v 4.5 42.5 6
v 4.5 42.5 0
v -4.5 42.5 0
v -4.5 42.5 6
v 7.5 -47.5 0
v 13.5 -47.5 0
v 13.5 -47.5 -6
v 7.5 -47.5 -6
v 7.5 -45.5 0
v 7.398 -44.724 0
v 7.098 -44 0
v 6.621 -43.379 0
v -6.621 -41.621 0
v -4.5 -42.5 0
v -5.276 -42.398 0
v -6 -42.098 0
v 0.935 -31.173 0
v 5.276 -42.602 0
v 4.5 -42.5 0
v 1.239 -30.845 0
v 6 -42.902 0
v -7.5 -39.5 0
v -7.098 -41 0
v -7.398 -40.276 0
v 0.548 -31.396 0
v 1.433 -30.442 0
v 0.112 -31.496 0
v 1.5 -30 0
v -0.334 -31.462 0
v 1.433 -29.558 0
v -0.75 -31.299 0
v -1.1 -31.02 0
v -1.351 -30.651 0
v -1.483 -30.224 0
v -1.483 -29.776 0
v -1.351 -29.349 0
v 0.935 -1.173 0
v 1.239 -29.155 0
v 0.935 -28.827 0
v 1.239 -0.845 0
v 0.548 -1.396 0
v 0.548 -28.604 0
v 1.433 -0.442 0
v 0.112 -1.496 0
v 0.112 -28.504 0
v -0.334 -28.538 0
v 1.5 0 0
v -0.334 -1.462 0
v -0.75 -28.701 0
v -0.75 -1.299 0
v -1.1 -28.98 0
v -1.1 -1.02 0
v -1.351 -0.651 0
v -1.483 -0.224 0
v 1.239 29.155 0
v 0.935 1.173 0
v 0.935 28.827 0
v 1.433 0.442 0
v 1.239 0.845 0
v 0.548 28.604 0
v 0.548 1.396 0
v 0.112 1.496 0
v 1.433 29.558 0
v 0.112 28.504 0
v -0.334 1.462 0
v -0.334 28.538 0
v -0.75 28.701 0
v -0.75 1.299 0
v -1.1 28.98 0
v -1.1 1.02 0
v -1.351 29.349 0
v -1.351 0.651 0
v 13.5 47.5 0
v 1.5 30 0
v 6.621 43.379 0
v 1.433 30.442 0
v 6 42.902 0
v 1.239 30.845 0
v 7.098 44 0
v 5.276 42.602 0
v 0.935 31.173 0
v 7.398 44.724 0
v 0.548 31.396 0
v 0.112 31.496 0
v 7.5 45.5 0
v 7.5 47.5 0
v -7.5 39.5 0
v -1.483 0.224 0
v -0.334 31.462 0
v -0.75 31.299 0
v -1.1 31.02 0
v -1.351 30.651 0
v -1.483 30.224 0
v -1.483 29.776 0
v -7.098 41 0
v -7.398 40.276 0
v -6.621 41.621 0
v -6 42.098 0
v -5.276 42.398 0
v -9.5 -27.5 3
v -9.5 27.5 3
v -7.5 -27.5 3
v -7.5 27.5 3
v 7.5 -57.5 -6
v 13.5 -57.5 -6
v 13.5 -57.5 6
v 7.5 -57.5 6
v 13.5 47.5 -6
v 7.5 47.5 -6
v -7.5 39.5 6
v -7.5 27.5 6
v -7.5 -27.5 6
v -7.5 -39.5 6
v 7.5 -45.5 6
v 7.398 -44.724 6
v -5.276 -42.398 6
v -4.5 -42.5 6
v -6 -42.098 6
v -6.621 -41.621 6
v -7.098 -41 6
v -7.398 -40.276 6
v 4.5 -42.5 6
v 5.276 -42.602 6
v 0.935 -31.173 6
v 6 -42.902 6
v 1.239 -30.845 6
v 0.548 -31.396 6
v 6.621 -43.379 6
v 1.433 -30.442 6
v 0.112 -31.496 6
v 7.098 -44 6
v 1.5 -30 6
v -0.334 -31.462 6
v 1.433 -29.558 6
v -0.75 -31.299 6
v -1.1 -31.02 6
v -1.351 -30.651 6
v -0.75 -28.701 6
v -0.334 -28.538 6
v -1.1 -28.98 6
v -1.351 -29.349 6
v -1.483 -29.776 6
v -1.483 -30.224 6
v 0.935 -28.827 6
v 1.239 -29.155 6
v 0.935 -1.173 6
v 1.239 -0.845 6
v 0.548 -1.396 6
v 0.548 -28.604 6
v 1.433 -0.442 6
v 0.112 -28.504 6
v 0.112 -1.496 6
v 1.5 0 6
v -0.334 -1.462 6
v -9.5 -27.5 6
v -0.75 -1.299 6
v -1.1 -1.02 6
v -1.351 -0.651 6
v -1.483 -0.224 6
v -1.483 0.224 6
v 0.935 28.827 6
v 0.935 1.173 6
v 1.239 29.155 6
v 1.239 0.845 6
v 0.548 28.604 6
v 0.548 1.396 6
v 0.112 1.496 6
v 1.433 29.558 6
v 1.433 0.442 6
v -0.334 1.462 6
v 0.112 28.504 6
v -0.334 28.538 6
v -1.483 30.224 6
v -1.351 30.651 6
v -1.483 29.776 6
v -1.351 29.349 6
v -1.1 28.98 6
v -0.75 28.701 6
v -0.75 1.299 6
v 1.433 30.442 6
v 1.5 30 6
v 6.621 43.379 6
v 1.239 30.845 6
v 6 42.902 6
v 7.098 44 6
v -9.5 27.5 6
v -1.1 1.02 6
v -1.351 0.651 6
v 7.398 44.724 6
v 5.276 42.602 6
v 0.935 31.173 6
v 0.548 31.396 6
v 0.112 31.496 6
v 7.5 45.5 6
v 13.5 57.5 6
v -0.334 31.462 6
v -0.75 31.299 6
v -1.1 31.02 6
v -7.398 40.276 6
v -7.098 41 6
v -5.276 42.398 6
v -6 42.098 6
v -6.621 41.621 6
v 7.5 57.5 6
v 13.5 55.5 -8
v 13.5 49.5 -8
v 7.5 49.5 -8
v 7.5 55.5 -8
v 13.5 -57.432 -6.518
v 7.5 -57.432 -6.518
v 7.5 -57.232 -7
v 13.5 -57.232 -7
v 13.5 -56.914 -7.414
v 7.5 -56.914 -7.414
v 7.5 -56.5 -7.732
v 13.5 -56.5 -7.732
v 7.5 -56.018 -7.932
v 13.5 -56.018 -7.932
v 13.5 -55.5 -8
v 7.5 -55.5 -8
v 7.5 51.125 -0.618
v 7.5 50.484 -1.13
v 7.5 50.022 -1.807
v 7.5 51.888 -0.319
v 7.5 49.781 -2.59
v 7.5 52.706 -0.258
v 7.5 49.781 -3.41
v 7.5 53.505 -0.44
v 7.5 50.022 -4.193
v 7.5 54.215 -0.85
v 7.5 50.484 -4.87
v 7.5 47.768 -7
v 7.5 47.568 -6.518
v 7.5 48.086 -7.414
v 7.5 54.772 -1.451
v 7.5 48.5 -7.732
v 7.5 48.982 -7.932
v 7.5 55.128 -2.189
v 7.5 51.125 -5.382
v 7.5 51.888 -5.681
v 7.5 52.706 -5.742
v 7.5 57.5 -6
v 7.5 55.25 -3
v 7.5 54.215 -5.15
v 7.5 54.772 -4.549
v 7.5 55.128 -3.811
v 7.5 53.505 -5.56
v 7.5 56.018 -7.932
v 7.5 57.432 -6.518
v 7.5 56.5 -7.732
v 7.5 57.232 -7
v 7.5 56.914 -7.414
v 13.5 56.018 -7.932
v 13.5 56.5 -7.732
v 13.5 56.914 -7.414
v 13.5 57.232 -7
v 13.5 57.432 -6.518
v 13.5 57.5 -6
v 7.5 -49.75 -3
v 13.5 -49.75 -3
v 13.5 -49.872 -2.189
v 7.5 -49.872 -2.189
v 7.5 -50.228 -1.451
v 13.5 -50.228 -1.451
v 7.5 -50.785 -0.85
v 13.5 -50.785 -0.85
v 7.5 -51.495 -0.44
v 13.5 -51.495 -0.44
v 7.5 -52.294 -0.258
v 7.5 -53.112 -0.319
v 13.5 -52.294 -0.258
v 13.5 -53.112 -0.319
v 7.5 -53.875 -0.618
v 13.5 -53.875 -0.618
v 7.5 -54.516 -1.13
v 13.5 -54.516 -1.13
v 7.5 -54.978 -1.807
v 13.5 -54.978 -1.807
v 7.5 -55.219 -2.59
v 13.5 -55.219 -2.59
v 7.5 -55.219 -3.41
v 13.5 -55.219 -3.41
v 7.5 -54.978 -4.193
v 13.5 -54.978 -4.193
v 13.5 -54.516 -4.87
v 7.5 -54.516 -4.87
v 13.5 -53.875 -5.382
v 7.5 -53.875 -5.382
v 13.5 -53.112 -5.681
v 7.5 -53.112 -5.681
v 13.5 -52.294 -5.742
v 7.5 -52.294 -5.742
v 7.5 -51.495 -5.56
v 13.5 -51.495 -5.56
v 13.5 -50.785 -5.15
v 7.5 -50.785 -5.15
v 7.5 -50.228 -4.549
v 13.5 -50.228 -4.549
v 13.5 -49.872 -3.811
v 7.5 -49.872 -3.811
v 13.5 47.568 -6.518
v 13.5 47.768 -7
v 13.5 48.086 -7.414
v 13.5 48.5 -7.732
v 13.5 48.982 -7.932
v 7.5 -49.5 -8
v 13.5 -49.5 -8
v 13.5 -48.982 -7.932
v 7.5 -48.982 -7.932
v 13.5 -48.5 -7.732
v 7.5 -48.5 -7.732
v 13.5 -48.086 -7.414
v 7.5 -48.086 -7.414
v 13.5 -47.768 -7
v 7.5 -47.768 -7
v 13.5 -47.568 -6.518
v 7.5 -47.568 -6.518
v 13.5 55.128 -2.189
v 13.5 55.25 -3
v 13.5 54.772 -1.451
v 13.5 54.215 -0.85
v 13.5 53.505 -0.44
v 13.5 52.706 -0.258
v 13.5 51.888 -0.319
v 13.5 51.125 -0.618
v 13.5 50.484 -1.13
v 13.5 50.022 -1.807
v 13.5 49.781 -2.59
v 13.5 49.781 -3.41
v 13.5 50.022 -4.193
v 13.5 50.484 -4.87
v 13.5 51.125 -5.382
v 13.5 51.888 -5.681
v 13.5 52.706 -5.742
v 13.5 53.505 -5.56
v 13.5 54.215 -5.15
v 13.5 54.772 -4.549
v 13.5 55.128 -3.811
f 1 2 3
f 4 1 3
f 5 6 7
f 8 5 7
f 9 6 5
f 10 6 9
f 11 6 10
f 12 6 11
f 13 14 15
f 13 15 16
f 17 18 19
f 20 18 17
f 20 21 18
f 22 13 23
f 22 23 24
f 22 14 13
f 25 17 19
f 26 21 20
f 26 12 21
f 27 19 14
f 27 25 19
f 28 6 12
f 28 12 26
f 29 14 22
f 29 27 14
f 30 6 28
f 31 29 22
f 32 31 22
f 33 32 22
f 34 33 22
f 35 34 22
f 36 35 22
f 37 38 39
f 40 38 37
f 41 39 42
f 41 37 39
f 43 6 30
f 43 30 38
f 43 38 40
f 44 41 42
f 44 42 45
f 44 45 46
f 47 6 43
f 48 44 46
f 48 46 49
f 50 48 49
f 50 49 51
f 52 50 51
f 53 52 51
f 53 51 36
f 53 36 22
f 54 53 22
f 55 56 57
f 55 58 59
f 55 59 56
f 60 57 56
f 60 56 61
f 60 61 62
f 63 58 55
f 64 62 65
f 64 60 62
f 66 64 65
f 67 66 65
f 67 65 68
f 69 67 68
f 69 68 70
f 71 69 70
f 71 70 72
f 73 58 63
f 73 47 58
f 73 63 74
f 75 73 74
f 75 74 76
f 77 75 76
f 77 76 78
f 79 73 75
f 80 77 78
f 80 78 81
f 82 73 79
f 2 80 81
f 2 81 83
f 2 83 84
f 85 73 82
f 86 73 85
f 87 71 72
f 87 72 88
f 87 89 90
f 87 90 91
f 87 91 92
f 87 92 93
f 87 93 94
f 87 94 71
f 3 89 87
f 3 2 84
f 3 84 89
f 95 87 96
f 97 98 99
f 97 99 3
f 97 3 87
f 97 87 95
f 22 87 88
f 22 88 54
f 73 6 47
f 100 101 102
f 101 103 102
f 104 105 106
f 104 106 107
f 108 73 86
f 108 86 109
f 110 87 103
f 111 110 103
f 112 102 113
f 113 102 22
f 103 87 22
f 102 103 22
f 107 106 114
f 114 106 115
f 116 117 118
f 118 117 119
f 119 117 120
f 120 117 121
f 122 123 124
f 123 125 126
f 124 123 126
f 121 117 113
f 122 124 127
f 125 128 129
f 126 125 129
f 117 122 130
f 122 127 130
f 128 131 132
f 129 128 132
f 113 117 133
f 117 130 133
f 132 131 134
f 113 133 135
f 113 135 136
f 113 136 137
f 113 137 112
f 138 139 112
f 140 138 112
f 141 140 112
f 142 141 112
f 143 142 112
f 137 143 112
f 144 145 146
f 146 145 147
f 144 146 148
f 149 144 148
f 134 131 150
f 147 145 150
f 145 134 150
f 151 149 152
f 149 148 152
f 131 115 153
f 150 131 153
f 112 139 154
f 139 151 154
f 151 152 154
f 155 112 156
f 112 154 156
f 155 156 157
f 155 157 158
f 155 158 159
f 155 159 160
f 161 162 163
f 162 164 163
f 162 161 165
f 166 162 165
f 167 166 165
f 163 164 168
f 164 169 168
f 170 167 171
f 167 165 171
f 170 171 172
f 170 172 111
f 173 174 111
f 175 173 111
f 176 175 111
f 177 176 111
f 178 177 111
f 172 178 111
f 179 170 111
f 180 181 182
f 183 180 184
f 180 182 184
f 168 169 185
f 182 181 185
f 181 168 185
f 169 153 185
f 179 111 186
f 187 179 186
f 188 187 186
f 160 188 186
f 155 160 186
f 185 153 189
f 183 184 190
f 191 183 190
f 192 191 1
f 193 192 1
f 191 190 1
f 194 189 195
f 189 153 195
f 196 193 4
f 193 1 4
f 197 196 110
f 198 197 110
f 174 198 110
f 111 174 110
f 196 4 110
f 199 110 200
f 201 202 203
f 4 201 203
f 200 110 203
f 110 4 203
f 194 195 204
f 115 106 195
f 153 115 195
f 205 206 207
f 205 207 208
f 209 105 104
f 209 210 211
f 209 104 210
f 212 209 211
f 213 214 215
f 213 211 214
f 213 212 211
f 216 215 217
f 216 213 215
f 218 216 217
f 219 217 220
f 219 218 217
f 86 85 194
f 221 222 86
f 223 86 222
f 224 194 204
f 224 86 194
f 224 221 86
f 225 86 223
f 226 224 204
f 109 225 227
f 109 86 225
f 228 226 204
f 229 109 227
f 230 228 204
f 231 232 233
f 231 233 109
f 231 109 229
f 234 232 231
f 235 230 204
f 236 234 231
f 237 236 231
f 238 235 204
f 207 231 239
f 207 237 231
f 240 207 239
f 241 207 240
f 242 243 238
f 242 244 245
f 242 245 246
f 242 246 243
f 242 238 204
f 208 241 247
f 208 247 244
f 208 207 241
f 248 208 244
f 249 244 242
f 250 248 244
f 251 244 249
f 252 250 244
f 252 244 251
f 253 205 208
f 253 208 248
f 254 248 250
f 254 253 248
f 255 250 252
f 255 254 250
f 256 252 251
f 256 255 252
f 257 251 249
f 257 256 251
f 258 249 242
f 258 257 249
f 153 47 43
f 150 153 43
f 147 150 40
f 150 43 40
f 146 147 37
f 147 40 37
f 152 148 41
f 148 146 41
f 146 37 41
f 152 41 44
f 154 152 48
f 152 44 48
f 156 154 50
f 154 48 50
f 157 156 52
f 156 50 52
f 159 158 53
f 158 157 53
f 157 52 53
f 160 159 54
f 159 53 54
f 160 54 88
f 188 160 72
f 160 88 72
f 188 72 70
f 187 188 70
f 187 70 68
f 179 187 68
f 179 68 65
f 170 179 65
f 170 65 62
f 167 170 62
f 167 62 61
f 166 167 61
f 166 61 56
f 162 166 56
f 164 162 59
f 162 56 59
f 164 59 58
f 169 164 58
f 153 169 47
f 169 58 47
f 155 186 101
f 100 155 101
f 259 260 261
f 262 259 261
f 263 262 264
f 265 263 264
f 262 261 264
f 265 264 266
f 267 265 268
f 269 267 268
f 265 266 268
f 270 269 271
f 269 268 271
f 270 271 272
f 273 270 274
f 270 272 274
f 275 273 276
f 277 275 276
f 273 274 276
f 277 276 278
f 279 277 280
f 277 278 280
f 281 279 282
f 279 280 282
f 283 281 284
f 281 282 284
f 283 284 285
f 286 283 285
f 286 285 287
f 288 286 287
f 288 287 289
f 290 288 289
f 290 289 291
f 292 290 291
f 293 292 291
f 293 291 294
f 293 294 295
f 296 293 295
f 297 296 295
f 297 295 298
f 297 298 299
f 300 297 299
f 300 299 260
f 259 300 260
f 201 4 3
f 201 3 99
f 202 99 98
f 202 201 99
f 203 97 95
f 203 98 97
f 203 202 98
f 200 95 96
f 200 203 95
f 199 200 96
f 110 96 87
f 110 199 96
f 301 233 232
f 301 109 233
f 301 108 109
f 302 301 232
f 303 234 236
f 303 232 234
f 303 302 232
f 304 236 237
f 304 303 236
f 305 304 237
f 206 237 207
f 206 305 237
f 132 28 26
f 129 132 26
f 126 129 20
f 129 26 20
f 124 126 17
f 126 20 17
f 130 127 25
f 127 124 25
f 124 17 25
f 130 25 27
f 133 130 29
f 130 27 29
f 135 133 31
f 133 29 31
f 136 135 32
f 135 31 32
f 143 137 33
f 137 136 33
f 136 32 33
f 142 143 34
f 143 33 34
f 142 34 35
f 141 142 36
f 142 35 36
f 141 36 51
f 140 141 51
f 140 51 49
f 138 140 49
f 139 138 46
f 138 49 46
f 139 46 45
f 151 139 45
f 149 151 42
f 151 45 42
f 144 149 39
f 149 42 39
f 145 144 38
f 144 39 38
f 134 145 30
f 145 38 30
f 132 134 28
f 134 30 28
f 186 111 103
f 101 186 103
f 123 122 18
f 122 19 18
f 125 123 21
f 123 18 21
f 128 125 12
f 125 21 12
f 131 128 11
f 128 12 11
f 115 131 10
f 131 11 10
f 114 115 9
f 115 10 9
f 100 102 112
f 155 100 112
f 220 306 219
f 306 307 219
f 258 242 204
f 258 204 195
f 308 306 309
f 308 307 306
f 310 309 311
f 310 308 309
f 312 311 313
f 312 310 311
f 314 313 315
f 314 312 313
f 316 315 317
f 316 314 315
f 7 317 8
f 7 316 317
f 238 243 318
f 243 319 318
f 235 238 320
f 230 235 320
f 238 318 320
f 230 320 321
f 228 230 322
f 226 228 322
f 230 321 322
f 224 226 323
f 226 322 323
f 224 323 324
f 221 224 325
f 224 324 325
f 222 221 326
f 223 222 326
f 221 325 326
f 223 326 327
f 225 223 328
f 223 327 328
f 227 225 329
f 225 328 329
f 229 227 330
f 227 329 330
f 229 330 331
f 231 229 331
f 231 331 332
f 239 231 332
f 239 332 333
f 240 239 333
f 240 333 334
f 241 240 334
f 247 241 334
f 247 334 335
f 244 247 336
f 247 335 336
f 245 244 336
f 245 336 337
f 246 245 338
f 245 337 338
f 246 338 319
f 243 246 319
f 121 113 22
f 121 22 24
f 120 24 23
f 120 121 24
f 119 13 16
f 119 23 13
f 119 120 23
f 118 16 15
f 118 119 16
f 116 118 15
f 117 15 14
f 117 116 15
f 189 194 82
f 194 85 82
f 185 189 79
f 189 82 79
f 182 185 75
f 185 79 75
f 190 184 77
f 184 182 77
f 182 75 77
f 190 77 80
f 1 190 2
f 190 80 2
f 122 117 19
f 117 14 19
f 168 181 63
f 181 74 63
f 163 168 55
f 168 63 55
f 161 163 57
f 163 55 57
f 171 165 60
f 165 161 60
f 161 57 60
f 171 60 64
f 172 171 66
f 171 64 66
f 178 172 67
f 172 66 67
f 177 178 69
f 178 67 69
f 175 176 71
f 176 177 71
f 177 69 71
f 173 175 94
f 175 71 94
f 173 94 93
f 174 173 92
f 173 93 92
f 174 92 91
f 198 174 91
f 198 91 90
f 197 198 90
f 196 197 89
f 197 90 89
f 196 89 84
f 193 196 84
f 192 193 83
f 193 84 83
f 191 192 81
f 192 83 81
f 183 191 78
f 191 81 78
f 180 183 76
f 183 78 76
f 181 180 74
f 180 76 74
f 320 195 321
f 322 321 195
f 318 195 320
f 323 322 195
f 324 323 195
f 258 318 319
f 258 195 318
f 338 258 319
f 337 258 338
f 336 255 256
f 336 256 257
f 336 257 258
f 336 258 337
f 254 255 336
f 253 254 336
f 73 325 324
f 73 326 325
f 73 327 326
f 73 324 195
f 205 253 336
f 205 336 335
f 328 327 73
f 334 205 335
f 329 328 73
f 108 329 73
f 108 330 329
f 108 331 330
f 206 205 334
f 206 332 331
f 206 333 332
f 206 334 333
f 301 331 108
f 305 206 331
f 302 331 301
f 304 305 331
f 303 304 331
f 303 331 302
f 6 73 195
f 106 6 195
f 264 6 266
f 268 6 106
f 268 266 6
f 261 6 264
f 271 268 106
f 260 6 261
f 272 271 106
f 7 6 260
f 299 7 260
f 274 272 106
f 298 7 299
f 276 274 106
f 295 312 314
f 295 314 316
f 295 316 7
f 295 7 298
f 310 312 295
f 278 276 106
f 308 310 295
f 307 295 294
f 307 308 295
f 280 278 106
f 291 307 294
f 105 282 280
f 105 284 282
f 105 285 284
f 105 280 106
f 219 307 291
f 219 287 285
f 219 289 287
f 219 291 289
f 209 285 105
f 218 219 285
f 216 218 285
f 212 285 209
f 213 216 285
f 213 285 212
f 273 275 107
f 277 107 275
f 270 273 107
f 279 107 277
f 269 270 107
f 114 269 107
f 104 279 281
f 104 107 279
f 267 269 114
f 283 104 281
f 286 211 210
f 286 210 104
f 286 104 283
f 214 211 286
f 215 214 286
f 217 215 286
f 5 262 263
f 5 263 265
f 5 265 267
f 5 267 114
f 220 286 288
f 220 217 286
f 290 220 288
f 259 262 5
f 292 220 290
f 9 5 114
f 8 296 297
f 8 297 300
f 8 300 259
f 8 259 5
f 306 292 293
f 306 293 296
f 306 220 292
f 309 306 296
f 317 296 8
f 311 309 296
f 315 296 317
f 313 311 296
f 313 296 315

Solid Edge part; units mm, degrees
sketch "Sketch1" plane through (0, 0, 0) normal (0, 0, 1) x (1, 0, 0)
  arc A0 (4.5, 42.5) -> (7.5, 45.5) centre (4.5, 45.5) ccw
  line L0 (7.5, 45.5) -> (7.5, 57.5)
  line L1 (7.5, 57.5) -> (13.5, 57.5)
  line L2 (13.5, 57.5) -> (13.5, -57.5)
  line L3 (13.5, -57.5) -> (7.5, -57.5)
  line L4 (7.5, -57.5) -> (7.5, -45.5)
  arc A1 (4.5, -42.5) -> (7.5, -45.5) centre (4.5, -45.5) cw
  line L5 (-7.5, -42.5) -> (4.5, -42.5)
  line L6 (-7.5, 42.5) -> (-7.5, -42.5)
  line L7 (4.5, 42.5) -> (-7.5, 42.5)
  circle A2 centre (0, 0) radius 1.5
  circle A3 centre (0, -30) radius 1.5
  circle A4 centre (0, 30) radius 1.5
extrude "Protrusion1" add sketch "Sketch1" along normal blind 6
fillet "Round_1" radius 3 2 edges at (-7.5, 42.5, 3) (-7.5, -42.5, 3)
sketch "Sketch2" plane through (13.5, 0, 2) normal (1, 0, 0) x (0, 1, 0)
  line L0 (-57.5, -2) -> (-47.5, -2)
  line L1 (-47.5, -2) -> (-47.5, -8)
  arc A0 (-49.5, -10) -> (-47.5, -8) centre (-49.5, -8) ccw
  line L2 (-49.5, -10) -> (-55.5, -10)
  arc A1 (-55.5, -10) -> (-57.5, -8) centre (-55.5, -8) cw
  line L3 (-57.5, -8) -> (-57.5, -2)
  circle A2 centre (-52.5, -5) radius 1.75
  line L4 (57.5, -2) -> (47.5, -2)
  line L5 (47.5, -2) -> (47.5, -8)
  arc A3 (49.5, -10) -> (47.5, -8) centre (49.5, -8) cw
  line L6 (49.5, -10) -> (55.5, -10)
  arc A4 (55.5, -10) -> (57.5, -8) centre (55.5, -8) ccw
  line L7 (57.5, -8) -> (57.5, -2)
  circle A5 centre (52.5, -5) radius 1.75
extrude "ExtrudedProtrusion_2" add sketch "Sketch2" against normal blind 6
sketch "Sketch3" plane through (-7.5, 0, 3) normal (-1, 0, 0) x (0, -1, 0)
  line L0 (-27.5, 0) -> (27.5, 0)
  line L1 (27.5, 0) -> (27.5, 3)
  line L2 (27.5, 3) -> (-27.5, 3)
  line L3 (-27.5, 3) -> (-27.5, 0)
extrude "ExtrudedProtrusion_3" add sketch "Sketch3" along normal blind 2
sketch "Sketch4" plane through (13.5, 0, -1) normal (1, 0, 0) x (0, 1, 0)
  circle A0 centre (-52.5, -2) radius 2.75
  circle A1 centre (52.5, -2) radius 2.75
extrude "ExtrudedCutout_1" cut sketch "Sketch4" against normal blind 10
